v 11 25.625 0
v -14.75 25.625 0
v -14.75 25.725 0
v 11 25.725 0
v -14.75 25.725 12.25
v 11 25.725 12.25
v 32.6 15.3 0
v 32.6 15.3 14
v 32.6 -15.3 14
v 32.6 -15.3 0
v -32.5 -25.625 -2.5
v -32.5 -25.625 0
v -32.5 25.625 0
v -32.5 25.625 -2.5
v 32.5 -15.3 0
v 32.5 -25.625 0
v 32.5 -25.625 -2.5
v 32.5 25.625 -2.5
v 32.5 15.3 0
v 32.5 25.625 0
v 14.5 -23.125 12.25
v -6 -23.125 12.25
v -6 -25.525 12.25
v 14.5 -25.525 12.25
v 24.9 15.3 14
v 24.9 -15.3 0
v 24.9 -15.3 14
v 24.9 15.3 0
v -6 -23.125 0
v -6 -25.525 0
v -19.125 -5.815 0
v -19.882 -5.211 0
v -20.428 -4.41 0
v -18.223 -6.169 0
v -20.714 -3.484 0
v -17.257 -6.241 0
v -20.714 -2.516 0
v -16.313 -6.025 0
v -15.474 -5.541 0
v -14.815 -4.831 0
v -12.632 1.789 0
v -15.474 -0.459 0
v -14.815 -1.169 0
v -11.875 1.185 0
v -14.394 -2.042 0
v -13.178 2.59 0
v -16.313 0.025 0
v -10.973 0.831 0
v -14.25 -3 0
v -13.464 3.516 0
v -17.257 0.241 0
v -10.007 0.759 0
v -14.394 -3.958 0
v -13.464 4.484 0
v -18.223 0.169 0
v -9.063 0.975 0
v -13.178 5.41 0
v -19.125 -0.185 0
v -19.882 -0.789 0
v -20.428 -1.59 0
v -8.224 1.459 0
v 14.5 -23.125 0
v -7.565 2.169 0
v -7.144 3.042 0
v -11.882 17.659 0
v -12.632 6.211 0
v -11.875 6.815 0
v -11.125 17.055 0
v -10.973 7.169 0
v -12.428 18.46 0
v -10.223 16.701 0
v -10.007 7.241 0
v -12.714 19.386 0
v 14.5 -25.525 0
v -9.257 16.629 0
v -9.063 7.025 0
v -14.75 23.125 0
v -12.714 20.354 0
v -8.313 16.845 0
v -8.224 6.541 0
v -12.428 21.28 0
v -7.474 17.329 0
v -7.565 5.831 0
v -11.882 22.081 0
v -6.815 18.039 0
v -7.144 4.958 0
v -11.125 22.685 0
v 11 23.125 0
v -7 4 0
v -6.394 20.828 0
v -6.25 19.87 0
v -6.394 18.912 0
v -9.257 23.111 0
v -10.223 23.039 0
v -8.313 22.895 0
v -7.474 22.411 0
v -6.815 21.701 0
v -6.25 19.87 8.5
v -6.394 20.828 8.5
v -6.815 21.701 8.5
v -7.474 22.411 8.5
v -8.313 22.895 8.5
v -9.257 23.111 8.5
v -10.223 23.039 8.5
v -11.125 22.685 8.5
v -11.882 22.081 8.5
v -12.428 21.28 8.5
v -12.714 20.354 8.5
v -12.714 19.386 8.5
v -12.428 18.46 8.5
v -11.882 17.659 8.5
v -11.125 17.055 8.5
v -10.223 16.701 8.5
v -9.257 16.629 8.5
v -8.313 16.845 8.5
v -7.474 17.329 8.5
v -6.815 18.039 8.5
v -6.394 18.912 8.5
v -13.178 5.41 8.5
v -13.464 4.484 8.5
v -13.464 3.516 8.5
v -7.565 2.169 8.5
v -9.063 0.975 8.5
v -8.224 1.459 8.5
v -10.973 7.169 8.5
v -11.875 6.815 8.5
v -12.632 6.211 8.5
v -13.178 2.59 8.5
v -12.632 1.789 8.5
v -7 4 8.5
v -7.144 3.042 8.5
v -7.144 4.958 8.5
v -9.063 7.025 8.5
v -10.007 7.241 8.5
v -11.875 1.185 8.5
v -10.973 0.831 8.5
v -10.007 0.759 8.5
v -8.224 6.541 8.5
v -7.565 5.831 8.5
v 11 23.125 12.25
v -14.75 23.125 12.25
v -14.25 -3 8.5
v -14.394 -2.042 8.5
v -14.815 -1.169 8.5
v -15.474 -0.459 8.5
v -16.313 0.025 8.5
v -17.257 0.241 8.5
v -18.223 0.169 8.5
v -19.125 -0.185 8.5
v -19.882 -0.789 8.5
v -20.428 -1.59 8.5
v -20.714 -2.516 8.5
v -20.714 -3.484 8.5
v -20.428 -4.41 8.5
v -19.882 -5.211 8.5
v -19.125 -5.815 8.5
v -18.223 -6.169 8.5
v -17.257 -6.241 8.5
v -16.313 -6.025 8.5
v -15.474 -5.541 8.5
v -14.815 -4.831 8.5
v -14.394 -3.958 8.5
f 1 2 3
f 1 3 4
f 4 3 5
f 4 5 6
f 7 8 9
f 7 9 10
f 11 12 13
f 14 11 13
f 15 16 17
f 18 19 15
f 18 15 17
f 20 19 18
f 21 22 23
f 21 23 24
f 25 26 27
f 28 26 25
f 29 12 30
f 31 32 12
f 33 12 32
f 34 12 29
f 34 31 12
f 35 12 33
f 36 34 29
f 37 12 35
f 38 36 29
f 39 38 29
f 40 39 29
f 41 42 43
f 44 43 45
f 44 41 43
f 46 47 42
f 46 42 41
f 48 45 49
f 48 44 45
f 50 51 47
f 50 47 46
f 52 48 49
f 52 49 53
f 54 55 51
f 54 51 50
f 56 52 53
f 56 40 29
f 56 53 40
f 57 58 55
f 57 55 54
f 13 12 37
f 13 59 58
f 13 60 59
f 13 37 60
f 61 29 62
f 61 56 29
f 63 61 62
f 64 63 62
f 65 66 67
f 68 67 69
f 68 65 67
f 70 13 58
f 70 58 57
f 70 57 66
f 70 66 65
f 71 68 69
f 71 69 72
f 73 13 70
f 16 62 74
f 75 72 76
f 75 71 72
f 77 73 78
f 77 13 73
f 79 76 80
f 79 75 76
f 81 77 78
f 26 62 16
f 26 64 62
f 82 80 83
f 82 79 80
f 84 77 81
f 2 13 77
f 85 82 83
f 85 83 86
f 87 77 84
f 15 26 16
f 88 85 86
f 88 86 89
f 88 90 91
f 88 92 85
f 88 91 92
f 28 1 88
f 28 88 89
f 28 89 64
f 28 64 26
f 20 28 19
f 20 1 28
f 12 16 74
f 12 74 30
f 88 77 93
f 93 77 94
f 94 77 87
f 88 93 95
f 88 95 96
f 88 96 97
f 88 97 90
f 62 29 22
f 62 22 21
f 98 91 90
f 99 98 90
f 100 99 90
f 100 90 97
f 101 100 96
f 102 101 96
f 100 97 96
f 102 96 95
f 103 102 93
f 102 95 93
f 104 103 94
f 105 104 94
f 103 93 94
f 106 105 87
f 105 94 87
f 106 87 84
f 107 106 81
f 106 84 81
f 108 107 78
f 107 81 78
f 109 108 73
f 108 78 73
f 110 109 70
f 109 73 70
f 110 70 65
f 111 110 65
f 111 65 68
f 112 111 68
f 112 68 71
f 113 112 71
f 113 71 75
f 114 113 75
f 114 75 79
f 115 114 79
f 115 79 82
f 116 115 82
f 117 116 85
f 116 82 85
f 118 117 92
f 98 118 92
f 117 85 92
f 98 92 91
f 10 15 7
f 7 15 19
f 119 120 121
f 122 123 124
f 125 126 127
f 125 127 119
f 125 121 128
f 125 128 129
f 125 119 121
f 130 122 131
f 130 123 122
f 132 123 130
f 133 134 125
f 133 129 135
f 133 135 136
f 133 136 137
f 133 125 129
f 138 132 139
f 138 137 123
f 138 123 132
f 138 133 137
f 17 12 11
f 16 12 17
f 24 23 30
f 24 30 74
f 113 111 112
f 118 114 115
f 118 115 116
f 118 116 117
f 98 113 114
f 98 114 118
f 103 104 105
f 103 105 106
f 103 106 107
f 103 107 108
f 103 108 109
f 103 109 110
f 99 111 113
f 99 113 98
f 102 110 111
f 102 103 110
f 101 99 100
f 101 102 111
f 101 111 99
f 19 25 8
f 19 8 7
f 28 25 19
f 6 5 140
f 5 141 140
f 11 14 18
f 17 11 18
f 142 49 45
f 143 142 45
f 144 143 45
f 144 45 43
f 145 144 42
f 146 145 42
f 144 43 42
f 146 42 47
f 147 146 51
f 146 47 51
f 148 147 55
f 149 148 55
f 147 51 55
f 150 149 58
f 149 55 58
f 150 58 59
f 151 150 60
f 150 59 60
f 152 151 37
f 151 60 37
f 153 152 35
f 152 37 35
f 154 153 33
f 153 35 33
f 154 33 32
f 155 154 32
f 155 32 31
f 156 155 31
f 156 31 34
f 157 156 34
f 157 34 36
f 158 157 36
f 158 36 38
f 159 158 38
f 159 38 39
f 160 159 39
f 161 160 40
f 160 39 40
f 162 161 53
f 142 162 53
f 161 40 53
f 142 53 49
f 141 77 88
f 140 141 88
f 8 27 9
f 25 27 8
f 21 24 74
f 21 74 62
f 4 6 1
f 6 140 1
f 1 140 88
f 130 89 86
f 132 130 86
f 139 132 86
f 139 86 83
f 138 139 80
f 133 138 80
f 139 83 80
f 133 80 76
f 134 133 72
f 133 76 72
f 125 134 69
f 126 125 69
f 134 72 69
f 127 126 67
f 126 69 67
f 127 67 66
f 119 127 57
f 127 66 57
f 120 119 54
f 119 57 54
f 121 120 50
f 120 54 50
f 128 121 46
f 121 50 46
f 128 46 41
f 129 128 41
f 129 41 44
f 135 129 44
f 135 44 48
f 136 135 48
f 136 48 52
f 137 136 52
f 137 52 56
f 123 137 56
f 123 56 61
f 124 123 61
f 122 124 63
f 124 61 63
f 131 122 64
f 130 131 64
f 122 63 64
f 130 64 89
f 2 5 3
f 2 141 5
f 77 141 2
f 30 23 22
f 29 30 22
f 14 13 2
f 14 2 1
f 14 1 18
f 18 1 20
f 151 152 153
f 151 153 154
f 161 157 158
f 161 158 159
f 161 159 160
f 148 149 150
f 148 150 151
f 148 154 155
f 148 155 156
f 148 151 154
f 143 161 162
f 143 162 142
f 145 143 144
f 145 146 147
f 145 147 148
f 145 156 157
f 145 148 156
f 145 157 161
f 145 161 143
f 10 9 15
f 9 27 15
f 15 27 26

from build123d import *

# Parameters (mm, degrees)
SKETCH1_R            = 3.25
BOSS_EXTRUDE1_DEPTH  = 8.5
SKETCH3_W            = 65
SKETCH3_H            = 51.25
BOSS_EXTRUDE2_DEPTH  = 2.5
SKETCH4_W            = 7.6
SKETCH4_H            = 30.6
BOSS_EXTRUDE3_DEPTH  = 14
SKETCH5_R            = 3.25
BOSS_EXTRUDE4_DEPTH  = 8.5
SKETCH6_W            = 25.75
SKETCH6_H            = 2.5
BOSS_EXTRUDE5_DEPTH  = 12.25
SKETCH8_R            = 3.25
BOSS_EXTRUDE9_DEPTH  = 8.5
SKETCH9_W            = 20.5
SKETCH9_H            = 2.5
BOSS_EXTRUDE10_DEPTH = 12.25
SKETCH10_W           = 20.5
SKETCH10_H           = 12.25
CUT_EXTRUDE1_DEPTH   = 0.1
SKETCH12_W           = 25.75
SKETCH12_H           = 12.25
BOSS_EXTRUDE11_DEPTH = 0.1
SKETCH14_W           = 14
SKETCH14_H           = 30.6
BOSS_EXTRUDE12_DEPTH = 0.1


with BuildPart() as part:
    # Sketch1 → Boss-Extrude1 (new body)
    with BuildSketch(Plane.XY):
        with Locations((-17.5, -3)):
            Circle(SKETCH1_R)
    extrude(amount=BOSS_EXTRUDE1_DEPTH)

    # Sketch3 → Boss-Extrude2 (add)
    with BuildSketch(Plane.XY):
        Rectangle(SKETCH3_W, SKETCH3_H)
    extrude(amount=-BOSS_EXTRUDE2_DEPTH)

    # Sketch4 → Boss-Extrude3 (add)
    with BuildSketch(Plane.XY):
        with Locations((28.7, 0)):
            Rectangle(SKETCH4_W, SKETCH4_H)
    extrude(amount=BOSS_EXTRUDE3_DEPTH)

    # Sketch5 → Boss-Extrude4 (add)
    with BuildSketch(Plane.XY):
        with Locations((-10.25, 4)):
            Circle(SKETCH5_R)
    extrude(amount=BOSS_EXTRUDE4_DEPTH)

    # Sketch6 → Boss-Extrude5 (add)
    with BuildSketch(Plane.XY):
        with Locations((-1.875, 24.375)):
            Rectangle(SKETCH6_W, SKETCH6_H)
    extrude(amount=BOSS_EXTRUDE5_DEPTH)

    # Sketch8 → Boss-Extrude9 (add)
    with BuildSketch(Plane.XY):
        with Locations((-9.5, 19.87)):
            Circle(SKETCH8_R)
    extrude(amount=BOSS_EXTRUDE9_DEPTH)

    # Sketch9 → Boss-Extrude10 (add)
    with BuildSketch(Plane.XY):
        with Locations((4.25, -24.375)):
            Rectangle(SKETCH9_W, SKETCH9_H)
    extrude(amount=BOSS_EXTRUDE10_DEPTH)

    # Sketch10 → Cut-Extrude1 (cut)
    with BuildSketch(Plane.XZ.offset(25.625)):
        with Locations((4.25, 6.125)):
            Rectangle(SKETCH10_W, SKETCH10_H)
    extrude(amount=-CUT_EXTRUDE1_DEPTH, mode=Mode.SUBTRACT)

    # Sketch12 → Boss-Extrude11 (add)
    with BuildSketch(Plane(origin=(0, 25.625, 0), x_dir=(1, 0, 0), z_dir=(0, 1, 0))):
        with Locations((-1.875, -6.125)):
            Rectangle(SKETCH12_W, SKETCH12_H)
    extrude(amount=BOSS_EXTRUDE11_DEPTH)

    # Sketch14 → Boss-Extrude12 (add)
    with BuildSketch(Plane(origin=(32.5, 0, 0), x_dir=(0, 0, -1), z_dir=(1, 0, 0))):
        with Locations((-7, 0)):
            Rectangle(SKETCH14_W, SKETCH14_H)
    extrude(amount=BOSS_EXTRUDE12_DEPTH)


solid = part.part
